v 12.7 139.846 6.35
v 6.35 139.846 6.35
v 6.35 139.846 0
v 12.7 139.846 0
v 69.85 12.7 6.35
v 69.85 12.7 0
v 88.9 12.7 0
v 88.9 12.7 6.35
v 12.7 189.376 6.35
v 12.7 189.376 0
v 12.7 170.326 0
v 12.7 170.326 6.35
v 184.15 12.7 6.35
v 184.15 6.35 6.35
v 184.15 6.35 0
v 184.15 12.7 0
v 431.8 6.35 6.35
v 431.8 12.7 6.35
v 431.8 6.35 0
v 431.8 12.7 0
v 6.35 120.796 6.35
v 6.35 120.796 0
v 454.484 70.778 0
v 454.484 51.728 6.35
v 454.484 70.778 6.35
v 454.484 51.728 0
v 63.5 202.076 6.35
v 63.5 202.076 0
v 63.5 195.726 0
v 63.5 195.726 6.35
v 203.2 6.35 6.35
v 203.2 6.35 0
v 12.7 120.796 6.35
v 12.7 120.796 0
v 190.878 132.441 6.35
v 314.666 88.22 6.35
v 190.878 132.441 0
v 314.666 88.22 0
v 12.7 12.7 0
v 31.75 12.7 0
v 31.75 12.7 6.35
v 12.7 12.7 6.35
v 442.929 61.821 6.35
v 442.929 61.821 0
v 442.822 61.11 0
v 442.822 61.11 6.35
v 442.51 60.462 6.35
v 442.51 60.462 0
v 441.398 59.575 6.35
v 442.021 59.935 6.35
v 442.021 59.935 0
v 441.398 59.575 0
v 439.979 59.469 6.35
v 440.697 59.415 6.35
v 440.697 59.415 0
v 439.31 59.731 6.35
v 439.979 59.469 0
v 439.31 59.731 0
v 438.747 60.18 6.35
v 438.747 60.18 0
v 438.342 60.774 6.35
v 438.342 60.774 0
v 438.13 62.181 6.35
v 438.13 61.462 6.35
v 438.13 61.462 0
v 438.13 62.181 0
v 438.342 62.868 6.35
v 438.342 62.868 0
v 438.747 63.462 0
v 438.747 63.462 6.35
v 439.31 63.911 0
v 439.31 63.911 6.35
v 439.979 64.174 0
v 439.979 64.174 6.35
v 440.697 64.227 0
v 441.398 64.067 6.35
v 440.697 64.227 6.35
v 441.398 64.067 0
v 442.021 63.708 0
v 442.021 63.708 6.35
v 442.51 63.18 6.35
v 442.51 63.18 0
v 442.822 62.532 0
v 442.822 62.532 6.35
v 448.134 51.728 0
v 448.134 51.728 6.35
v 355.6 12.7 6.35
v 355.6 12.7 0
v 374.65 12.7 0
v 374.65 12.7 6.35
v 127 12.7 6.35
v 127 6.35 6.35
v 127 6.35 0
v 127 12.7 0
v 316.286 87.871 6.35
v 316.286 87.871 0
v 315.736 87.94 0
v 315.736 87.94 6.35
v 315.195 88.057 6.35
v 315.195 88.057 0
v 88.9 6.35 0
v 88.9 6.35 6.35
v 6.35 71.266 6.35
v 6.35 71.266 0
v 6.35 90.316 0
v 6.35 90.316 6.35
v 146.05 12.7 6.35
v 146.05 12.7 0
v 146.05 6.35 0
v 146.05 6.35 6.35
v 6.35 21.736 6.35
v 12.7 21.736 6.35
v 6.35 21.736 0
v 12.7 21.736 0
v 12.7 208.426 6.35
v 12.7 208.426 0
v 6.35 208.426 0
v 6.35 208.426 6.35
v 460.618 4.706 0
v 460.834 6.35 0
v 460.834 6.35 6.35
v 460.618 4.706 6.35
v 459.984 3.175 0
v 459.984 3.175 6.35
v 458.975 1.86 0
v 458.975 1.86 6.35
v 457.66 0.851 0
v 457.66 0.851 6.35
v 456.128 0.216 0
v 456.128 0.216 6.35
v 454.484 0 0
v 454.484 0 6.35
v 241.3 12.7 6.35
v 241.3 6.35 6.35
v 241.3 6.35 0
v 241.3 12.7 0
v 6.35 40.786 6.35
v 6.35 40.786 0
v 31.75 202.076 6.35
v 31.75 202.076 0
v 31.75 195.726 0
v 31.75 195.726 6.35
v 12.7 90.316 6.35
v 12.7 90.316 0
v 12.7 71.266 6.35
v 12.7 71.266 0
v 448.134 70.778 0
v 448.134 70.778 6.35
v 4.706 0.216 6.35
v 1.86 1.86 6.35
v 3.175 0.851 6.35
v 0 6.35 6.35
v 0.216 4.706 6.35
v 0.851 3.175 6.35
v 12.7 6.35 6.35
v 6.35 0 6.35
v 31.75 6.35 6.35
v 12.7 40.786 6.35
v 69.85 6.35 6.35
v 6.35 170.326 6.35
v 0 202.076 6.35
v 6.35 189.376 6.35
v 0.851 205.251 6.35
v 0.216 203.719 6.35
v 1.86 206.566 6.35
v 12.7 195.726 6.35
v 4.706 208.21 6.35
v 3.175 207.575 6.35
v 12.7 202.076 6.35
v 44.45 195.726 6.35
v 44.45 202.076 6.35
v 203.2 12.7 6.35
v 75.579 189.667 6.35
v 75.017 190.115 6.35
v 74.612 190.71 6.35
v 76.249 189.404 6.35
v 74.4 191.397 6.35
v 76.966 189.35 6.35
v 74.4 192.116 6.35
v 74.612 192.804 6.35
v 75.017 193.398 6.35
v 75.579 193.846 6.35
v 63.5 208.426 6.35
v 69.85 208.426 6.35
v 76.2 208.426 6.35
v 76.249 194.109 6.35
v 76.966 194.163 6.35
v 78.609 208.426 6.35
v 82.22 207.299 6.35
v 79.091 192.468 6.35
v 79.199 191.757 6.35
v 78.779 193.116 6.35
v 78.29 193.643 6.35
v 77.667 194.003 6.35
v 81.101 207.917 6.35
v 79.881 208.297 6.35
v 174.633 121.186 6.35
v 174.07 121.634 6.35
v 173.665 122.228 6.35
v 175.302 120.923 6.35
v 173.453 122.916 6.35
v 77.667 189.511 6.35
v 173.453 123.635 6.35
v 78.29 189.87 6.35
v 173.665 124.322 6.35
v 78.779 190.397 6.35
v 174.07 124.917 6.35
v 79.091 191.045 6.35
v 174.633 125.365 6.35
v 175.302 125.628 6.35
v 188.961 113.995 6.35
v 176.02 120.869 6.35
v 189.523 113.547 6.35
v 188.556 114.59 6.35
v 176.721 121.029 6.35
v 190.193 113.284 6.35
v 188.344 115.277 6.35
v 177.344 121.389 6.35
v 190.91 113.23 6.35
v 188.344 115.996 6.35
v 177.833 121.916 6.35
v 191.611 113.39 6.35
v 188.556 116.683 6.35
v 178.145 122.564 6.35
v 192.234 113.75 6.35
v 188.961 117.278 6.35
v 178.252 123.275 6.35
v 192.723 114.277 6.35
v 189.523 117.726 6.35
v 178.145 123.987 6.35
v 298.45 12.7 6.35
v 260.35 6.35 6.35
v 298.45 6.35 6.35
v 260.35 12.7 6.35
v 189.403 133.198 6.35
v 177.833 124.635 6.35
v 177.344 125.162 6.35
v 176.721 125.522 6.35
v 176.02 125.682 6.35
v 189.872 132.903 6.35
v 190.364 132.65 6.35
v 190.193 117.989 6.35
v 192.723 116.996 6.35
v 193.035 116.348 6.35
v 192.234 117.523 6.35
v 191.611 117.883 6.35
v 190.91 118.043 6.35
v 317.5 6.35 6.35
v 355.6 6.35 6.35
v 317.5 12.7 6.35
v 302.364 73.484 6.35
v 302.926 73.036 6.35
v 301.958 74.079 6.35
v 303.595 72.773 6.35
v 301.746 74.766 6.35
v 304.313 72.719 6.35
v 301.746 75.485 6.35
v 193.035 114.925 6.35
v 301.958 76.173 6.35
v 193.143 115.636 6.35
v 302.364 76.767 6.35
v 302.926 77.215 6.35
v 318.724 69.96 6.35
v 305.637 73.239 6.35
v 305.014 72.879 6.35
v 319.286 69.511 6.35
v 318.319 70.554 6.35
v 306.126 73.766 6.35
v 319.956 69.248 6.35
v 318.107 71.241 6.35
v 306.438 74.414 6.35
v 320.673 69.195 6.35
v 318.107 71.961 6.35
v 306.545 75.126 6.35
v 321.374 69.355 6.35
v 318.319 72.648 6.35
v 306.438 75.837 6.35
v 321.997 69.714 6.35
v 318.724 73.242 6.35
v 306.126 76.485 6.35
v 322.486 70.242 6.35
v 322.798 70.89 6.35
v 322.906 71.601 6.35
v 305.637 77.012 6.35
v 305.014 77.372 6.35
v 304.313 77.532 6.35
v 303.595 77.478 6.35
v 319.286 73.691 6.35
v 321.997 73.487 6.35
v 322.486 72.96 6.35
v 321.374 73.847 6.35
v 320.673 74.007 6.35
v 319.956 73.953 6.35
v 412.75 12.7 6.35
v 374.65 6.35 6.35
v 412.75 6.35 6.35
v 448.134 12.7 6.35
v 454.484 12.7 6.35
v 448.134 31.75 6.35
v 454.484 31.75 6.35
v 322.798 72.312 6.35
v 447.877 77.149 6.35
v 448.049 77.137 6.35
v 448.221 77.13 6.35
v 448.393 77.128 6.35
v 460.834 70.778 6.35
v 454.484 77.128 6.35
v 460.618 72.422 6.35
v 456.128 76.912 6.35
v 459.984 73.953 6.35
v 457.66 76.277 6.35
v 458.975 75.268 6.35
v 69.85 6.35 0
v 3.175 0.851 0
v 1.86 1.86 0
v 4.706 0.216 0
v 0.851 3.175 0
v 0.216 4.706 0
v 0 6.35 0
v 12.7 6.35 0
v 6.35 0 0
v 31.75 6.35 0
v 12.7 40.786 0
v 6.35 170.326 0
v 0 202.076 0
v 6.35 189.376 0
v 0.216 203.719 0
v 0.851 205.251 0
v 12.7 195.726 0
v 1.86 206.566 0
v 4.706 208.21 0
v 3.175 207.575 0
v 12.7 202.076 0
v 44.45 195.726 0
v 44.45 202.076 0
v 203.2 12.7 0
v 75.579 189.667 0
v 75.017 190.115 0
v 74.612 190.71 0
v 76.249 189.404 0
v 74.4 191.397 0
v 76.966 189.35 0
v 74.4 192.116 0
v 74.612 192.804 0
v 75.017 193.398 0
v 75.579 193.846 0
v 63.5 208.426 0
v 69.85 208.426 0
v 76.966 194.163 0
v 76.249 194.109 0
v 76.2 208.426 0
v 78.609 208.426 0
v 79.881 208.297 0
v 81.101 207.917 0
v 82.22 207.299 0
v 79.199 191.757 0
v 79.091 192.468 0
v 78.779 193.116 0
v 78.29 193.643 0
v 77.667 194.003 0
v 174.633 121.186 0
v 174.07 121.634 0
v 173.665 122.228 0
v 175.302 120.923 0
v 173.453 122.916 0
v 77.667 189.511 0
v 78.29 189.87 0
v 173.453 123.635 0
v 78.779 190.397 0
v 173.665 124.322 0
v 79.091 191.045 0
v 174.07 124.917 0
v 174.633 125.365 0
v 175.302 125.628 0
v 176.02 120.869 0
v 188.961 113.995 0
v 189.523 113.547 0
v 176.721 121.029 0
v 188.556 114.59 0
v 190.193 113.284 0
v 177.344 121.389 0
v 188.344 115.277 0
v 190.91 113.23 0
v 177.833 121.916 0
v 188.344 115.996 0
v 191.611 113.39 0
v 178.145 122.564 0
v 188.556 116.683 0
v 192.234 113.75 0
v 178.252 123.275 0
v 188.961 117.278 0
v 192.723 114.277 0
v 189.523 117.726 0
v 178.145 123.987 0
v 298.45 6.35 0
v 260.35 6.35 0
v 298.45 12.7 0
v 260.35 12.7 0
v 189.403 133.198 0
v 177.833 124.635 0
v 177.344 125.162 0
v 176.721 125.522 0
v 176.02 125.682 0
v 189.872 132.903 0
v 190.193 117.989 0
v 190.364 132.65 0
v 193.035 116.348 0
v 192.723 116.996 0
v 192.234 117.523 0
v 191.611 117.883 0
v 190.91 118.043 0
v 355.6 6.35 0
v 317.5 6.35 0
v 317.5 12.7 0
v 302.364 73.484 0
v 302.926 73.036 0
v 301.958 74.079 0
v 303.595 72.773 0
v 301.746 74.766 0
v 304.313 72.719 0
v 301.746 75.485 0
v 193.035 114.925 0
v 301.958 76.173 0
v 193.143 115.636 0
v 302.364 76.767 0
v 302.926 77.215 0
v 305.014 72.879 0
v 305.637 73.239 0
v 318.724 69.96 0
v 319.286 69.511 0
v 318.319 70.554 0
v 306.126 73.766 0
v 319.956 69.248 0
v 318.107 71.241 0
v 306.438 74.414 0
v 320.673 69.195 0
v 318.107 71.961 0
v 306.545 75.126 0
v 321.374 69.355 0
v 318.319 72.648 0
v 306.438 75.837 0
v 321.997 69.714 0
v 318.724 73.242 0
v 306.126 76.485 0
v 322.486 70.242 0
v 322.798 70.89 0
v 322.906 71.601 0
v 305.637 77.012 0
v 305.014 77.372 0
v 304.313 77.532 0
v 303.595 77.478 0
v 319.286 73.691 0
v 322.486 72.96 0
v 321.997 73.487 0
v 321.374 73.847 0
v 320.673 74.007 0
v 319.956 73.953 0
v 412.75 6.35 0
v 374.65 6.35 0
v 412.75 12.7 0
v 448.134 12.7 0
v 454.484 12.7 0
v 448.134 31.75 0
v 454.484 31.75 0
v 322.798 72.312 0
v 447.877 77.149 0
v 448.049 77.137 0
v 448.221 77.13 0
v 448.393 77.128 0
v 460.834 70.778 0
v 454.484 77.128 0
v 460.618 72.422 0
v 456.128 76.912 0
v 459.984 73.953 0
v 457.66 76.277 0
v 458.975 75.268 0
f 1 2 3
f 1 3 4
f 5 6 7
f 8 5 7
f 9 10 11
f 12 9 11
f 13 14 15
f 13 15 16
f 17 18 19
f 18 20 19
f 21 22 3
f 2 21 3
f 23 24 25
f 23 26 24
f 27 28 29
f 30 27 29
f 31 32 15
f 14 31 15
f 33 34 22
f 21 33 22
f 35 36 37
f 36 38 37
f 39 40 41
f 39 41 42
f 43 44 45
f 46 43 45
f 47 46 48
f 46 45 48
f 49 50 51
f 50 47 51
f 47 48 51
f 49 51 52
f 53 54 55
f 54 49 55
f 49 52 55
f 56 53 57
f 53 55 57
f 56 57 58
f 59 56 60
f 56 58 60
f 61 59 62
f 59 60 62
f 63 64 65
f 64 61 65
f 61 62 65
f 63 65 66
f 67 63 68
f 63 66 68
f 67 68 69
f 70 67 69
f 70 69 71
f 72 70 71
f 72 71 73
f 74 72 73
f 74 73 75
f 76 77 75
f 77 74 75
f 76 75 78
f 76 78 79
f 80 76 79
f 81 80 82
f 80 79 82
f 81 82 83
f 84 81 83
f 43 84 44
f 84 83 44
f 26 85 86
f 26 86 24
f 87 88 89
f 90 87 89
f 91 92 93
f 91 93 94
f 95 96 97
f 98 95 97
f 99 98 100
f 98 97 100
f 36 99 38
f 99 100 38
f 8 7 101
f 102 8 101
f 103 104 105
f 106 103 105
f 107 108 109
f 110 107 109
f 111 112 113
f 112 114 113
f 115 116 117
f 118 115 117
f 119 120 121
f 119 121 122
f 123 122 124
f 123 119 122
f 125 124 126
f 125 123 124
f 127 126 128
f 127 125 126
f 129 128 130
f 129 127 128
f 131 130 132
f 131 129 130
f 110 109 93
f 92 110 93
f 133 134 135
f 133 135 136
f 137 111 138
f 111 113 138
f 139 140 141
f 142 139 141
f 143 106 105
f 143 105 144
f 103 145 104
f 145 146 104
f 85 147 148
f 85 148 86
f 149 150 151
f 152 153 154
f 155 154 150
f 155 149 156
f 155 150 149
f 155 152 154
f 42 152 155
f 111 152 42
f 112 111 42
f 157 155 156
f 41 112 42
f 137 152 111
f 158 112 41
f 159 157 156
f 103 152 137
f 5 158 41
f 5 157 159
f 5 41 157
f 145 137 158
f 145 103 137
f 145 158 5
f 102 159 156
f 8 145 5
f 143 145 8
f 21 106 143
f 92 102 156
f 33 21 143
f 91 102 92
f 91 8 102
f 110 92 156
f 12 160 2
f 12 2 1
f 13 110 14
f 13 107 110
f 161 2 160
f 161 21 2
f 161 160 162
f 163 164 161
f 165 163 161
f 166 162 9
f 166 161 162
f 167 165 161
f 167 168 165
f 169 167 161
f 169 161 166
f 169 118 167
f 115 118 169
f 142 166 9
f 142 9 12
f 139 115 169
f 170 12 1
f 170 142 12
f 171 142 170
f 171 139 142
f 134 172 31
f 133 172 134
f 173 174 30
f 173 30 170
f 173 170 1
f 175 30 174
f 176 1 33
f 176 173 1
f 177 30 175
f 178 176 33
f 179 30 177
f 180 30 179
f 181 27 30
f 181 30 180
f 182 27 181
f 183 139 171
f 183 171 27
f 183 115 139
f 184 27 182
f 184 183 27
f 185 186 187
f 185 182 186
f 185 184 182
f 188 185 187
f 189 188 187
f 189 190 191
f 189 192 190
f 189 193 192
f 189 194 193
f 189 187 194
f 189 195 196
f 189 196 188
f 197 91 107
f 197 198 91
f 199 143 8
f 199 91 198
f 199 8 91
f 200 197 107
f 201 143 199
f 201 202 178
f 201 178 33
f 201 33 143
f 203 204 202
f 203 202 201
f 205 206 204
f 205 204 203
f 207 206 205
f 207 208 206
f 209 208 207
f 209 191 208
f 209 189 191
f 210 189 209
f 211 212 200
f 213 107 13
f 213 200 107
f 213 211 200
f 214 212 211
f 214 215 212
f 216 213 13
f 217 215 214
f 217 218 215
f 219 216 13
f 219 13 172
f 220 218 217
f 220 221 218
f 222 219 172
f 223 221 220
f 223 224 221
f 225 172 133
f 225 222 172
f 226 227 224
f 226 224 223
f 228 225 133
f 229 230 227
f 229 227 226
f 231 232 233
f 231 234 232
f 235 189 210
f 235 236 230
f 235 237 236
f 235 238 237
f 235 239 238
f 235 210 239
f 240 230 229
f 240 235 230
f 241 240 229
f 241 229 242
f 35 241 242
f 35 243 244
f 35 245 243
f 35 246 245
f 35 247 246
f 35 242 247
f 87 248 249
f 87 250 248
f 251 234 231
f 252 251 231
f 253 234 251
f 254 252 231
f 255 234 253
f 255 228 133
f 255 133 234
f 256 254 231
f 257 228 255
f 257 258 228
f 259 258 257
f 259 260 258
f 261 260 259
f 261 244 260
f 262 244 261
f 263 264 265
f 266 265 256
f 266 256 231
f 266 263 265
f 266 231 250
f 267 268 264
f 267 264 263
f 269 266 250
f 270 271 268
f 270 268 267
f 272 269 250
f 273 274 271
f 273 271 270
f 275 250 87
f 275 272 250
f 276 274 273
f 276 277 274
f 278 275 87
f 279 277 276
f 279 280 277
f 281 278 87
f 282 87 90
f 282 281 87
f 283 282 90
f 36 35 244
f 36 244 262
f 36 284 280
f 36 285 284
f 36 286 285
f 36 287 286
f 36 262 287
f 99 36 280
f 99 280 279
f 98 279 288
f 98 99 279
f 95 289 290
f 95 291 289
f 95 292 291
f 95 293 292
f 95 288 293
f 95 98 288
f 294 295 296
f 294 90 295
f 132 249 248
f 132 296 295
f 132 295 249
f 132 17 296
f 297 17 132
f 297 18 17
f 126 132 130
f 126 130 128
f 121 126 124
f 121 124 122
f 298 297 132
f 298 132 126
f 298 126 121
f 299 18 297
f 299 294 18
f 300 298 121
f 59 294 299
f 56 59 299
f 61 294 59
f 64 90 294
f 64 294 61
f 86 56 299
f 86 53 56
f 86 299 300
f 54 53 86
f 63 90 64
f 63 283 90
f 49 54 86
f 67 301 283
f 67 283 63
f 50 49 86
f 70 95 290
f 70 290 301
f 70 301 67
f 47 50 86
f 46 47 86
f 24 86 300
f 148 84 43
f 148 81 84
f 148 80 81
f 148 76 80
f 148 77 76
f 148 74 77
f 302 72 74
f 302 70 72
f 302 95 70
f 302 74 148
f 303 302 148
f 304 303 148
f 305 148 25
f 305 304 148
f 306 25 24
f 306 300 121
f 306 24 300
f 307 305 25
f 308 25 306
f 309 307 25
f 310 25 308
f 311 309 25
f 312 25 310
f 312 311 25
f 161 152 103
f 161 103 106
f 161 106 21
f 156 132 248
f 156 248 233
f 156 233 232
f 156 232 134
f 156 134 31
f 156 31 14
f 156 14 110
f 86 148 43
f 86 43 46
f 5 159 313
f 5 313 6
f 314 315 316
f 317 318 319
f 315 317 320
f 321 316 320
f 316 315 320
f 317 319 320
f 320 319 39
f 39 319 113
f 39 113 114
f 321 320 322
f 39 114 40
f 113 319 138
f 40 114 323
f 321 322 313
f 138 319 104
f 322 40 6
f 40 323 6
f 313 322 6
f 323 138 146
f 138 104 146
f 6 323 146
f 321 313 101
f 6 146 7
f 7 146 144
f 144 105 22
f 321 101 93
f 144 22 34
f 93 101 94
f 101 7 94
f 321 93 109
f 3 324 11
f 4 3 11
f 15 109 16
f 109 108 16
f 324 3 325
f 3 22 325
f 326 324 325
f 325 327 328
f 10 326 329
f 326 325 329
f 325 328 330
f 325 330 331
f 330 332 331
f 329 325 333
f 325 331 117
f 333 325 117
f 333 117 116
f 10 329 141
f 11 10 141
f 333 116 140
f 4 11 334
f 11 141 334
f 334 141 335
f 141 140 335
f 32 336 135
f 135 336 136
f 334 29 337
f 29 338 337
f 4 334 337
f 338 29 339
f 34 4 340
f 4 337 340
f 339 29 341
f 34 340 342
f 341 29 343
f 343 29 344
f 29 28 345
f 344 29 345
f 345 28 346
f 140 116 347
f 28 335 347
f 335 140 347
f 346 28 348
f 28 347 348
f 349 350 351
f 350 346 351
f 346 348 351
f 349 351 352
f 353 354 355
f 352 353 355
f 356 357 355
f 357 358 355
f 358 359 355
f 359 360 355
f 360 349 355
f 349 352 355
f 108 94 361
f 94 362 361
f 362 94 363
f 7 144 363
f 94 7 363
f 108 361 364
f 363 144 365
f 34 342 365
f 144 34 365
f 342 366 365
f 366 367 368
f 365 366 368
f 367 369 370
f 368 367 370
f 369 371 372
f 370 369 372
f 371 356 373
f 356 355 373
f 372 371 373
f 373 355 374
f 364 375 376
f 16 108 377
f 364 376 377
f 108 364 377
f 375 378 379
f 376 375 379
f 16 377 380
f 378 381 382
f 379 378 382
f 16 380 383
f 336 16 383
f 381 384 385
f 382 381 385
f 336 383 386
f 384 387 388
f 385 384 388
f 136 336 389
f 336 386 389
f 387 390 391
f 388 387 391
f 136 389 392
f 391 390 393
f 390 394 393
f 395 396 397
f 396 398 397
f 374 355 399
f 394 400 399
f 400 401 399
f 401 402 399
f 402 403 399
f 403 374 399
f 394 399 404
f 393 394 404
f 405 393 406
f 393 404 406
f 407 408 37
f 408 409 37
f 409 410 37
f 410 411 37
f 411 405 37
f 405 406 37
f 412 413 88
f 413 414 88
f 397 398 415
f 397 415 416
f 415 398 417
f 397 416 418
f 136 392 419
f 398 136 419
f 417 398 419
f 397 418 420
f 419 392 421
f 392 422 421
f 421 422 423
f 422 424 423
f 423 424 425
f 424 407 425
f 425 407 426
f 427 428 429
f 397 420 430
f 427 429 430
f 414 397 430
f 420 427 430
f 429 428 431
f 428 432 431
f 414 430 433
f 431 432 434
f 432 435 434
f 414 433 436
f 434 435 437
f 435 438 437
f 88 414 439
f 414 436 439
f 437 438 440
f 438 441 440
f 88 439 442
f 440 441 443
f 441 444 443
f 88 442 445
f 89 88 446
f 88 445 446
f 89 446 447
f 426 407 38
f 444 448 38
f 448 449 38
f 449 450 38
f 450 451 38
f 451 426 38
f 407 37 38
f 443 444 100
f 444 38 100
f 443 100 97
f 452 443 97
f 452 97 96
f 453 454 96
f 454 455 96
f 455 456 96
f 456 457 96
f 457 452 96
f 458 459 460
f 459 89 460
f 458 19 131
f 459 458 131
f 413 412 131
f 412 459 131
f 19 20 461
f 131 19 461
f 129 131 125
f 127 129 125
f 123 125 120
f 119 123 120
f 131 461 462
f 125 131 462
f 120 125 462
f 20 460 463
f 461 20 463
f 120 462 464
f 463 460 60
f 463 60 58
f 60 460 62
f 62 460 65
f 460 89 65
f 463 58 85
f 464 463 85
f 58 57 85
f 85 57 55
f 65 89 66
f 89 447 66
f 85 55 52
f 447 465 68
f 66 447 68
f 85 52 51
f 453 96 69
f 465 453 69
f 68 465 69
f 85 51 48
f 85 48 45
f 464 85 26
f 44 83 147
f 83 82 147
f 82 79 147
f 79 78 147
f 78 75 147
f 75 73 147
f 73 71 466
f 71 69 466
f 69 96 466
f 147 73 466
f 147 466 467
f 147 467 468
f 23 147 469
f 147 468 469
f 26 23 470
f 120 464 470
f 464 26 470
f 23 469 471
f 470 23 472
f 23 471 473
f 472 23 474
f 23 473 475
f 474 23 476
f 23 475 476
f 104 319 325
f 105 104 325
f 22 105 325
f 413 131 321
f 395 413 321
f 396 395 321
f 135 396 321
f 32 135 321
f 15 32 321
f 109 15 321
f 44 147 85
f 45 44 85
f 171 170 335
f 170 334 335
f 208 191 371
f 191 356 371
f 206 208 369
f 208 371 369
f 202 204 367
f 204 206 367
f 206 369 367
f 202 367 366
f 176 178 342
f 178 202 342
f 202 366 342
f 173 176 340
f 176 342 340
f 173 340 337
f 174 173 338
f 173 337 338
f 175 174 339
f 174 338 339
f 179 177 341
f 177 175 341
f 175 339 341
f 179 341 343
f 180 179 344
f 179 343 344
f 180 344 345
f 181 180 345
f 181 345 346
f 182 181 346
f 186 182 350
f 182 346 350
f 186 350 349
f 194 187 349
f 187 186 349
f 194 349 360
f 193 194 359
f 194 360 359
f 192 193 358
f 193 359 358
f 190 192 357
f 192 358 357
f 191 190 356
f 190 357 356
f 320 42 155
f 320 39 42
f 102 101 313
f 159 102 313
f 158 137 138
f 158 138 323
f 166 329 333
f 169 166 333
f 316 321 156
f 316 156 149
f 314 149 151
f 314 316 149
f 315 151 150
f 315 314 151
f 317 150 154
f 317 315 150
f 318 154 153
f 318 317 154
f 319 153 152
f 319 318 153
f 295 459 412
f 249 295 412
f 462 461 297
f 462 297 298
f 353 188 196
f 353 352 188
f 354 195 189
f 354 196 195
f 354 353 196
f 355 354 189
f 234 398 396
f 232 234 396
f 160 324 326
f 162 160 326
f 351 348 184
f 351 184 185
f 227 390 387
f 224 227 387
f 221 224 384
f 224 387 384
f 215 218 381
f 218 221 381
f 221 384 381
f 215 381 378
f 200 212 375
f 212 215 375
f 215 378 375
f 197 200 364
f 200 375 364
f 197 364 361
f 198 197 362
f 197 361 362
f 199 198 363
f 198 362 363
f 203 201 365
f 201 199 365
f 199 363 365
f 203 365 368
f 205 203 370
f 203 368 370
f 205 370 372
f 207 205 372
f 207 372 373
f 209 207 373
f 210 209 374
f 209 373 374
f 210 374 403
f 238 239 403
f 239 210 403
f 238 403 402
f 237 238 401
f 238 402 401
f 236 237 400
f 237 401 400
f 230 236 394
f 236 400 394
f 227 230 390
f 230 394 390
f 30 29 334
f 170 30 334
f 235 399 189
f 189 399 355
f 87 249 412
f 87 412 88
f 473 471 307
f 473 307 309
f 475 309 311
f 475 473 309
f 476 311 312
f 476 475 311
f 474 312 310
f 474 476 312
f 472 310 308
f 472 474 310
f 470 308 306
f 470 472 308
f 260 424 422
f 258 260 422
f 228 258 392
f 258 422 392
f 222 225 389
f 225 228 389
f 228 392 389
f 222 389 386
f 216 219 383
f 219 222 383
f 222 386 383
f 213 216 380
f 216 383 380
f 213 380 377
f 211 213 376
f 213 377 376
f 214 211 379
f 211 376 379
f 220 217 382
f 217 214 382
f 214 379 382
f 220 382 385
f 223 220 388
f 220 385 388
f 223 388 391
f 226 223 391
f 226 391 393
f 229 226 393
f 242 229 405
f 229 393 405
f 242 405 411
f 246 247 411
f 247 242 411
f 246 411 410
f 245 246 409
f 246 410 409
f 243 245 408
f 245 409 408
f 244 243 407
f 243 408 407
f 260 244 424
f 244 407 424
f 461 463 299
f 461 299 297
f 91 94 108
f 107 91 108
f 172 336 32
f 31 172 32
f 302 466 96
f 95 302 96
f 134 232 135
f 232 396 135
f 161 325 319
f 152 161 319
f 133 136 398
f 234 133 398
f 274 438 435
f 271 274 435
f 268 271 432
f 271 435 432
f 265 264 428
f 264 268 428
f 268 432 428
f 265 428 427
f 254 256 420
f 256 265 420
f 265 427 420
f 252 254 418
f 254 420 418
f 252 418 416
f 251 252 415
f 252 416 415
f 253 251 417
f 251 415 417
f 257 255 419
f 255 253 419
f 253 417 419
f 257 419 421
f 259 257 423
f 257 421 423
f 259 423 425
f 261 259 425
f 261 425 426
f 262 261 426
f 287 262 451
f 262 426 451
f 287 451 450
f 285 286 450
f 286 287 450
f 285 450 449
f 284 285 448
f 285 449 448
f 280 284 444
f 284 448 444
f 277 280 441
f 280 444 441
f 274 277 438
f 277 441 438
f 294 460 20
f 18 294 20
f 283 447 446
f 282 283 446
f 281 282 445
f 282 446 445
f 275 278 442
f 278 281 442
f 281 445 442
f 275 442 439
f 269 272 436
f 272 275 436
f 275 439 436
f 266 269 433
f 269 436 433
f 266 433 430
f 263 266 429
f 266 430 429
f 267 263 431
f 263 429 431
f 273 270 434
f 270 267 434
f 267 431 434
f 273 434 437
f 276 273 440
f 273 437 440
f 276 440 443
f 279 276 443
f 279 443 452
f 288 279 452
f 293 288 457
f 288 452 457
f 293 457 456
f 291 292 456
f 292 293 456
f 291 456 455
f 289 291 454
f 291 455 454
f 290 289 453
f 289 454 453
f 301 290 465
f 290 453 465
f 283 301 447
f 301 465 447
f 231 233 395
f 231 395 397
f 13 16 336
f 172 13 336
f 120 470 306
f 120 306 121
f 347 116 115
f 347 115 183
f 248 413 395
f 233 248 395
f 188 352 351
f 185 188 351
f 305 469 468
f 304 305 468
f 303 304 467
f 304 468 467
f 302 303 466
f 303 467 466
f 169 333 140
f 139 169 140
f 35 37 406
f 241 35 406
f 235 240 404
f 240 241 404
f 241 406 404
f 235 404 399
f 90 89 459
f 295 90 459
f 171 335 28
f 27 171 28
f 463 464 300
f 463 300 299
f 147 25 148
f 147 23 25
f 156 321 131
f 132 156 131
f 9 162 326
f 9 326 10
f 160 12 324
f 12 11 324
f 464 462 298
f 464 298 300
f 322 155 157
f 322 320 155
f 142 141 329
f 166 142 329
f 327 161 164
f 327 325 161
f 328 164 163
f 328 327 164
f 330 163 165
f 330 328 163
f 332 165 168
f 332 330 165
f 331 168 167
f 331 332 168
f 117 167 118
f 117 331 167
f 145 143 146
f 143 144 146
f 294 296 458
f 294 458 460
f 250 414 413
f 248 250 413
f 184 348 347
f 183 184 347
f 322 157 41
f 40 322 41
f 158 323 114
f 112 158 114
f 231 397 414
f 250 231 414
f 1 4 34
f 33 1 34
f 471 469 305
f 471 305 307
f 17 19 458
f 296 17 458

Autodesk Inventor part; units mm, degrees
ref_plane "YZ Plane" through (0, 0, 0) normal (1, 0, 0) x (0, 1, 0)
ref_plane "XZ Plane" through (0, 0, 0) normal (0, 1, 0) x (-1, 0, 0)
ref_plane "XY Plane" through (0, 0, 0) normal (0, 0, 1) x (1, 0, 0)
sketch "Sketch1" plane through (0, 0, 0) normal (0, 0, 1) x (1, 0, 0)
  line L0 (447.8771, 77.149) -> (316.286, 87.8713)
  line L1 (314.6655, 88.2204) -> (190.8775, 132.4412)
  line L2 (189.4026, 133.1978) -> (82.2199, 207.2992)
  line L3 (0, 202.0759) -> (0, 6.35)
  circle A0 centre (440.5162, 61.8212) radius 2.413
  circle A1 centre (320.4926, 71.6009) radius 2.413
  line L4 (448.1345, 77.128) -> (443.7313, 23.0895) construction
  line L5 (315.4528, 87.9391) -> (312.3268, 49.5751) construction
  line L6 (315.4528, 87.9391) -> (300.5748, 46.291) construction
  circle A2 centre (190.7297, 115.6365) radius 2.413
  circle A3 centre (304.1324, 75.1256) radius 2.413
  line L7 (190.0903, 132.7224) -> (175.3821, 91.5497) construction
  line L8 (190.0903, 132.7224) -> (160.9674, 90.5981) construction
  circle A4 centre (175.8392, 123.2754) radius 2.413
  circle A5 centre (76.7856, 191.7567) radius 2.413
  line L9 (80.5901, 208.4259) -> (54.0448, 170.0299) construction
  line L10 (69.85, 208.4259) -> (76.2, 208.4259)
  line L11 (76.2, 202.0759) -> (76.2, 208.4259) construction
  line L12 (448.3928, 77.128) -> (454.4845, 77.128)
  line L13 (12.7, 208.4259) -> (6.35, 208.4259)
  line L14 (78.6088, 208.4259) -> (63.5, 208.4259)
  line L15 (12.7, 208.4259) -> (63.5, 208.4259)
  line L16 (12.7, 202.0759) -> (31.75, 202.0759)
  line L17 (31.75, 202.0759) -> (31.75, 195.7259)
  line L18 (31.75, 195.7259) -> (12.7, 195.7259)
  line L19 (12.7, 195.7259) -> (12.7, 202.0759)
  line L20 (44.45, 202.0759) -> (63.5, 202.0759)
  line L21 (63.5, 202.0759) -> (63.5, 195.7259)
  line L22 (63.5, 195.7259) -> (44.45, 195.7259)
  line L23 (44.45, 195.7259) -> (44.45, 202.0759)
  line L24 (63.5, 195.7259) -> (71.8099, 195.7259) construction
  line L25 (71.8099, 195.7259) -> (71.8099, 208.4259) construction
  line L26 (12.7, 6.35) -> (31.75, 6.35)
  line L27 (31.75, 6.35) -> (31.75, 12.7)
  line L28 (31.75, 12.7) -> (12.7, 12.7)
  line L29 (12.7, 12.7) -> (12.7, 6.35)
  line L30 (69.85, 12.7) -> (88.9, 12.7)
  line L31 (88.9, 12.7) -> (88.9, 6.35)
  line L32 (88.9, 6.35) -> (69.85, 6.35)
  line L33 (69.85, 6.35) -> (69.85, 12.7)
  line L34 (127, 12.7) -> (146.05, 12.7)
  line L35 (146.05, 12.7) -> (146.05, 6.35)
  line L36 (146.05, 6.35) -> (127, 6.35)
  line L37 (127, 6.35) -> (127, 12.7)
  line L38 (184.15, 12.7) -> (203.2, 12.7)
  line L39 (203.2, 12.7) -> (203.2, 6.35)
  line L40 (203.2, 6.35) -> (184.15, 6.35)
  line L41 (184.15, 6.35) -> (184.15, 12.7)
  line L42 (241.3, 12.7) -> (260.35, 12.7)
  line L43 (260.35, 12.7) -> (260.35, 6.35)
  line L44 (260.35, 6.35) -> (241.3, 6.35)
  line L45 (241.3, 6.35) -> (241.3, 12.7)
  line L46 (298.45, 12.7) -> (317.5, 12.7)
  line L47 (317.5, 12.7) -> (317.5, 6.35)
  line L48 (317.5, 6.35) -> (298.45, 6.35)
  line L49 (298.45, 6.35) -> (298.45, 12.7)
  line L50 (355.6, 12.7) -> (374.65, 12.7)
  line L51 (374.65, 12.7) -> (374.65, 6.35)
  line L52 (374.65, 6.35) -> (355.6, 6.35)
  line L53 (355.6, 6.35) -> (355.6, 12.7)
  line L54 (412.75, 12.7) -> (431.8, 12.7)
  line L55 (431.8, 12.7) -> (431.8, 6.35)
  line L56 (431.8, 6.35) -> (412.75, 6.35)
  line L57 (412.75, 6.35) -> (412.75, 12.7)
  line L58 (460.8345, 70.778) -> (460.8345, 6.35)
  line L59 (454.4845, 0) -> (454.4845, 0)
  line L60 (448.1345, 12.7) -> (454.4845, 12.7)
  line L61 (454.4845, 12.7) -> (454.4845, 31.75)
  line L62 (454.4845, 31.75) -> (448.1345, 31.75)
  line L63 (448.1345, 31.75) -> (448.1345, 12.7)
  line L64 (448.1345, 51.728) -> (454.4845, 51.728)
  line L65 (454.4845, 51.728) -> (454.4845, 70.778)
  line L66 (454.4845, 70.778) -> (448.1345, 70.778)
  line L67 (448.1345, 70.778) -> (448.1345, 51.728)
  line L68 (6.35, 189.3759) -> (12.7, 189.3759)
  line L69 (12.7, 189.3759) -> (12.7, 170.3259)
  line L70 (12.7, 170.3259) -> (6.35, 170.3259)
  line L71 (6.35, 170.3259) -> (6.35, 189.3759)
  line L72 (6.35, 139.8459) -> (12.7, 139.8459)
  line L73 (12.7, 139.8459) -> (12.7, 120.7959)
  line L74 (12.7, 120.7959) -> (6.35, 120.7959)
  line L75 (6.35, 120.7959) -> (6.35, 139.8459)
  line L76 (6.35, 90.3159) -> (12.7, 90.3159)
  line L77 (12.7, 90.3159) -> (12.7, 71.2659)
  line L78 (12.7, 71.2659) -> (6.35, 71.2659)
  line L79 (6.35, 71.2659) -> (6.35, 90.3159)
  line L80 (6.35, 40.7859) -> (12.7, 40.7859)
  line L81 (12.7, 40.7859) -> (12.7, 21.7359)
  line L82 (12.7, 21.7359) -> (6.35, 21.7359)
  line L83 (6.35, 21.7359) -> (6.35, 40.7859)
  arc A6 (6.35, 208.4259) -> (0, 202.0759) centre (6.35, 202.0759) ccw
  arc A7 (82.2199, 207.2992) -> (78.6088, 208.4259) centre (78.6088, 202.0759) ccw
  arc A8 (189.4026, 133.1978) -> (190.8775, 132.4412) centre (193.0137, 138.4211) ccw
  arc A9 (314.6655, 88.2204) -> (316.286, 87.8713) centre (316.8017, 94.2003) ccw
  arc A10 (447.8771, 77.149) -> (448.3928, 77.128) centre (448.3928, 83.478) ccw
  arc A11 (460.8345, 70.778) -> (454.4845, 77.128) centre (454.4845, 70.778) ccw
  arc A12 (454.4845, 0) -> (460.8345, 6.35) centre (454.4845, 6.35) ccw
  arc A13 (0, 6.35) -> (6.35, 0) centre (6.35, 6.35) ccw
  line L84 (6.35, 0) -> (454.4845, 0)
  point P0 (0, 0)
  point P1 (0, 0)
  point P2 (460.8345, 77.128)
  dimension "d3" = 4.826
  dimension "d4" = 4.826
  dimension "d5" = 15.875
  dimension "d6" = 15.875
  dimension "d7" = 120.4214
  dimension "d8" = 90
  dimension "d9" = 6.35
  dimension "d11" = 90
  dimension "d12" = 90
  dimension "d13" = 165
  dimension "d14" = 6.35
  dimension "d16" = 4.826
  dimension "d17" = 4.826
  dimension "d18" = 6.35
  dimension "d19" = 15.875
  dimension "d20" = 15.875
  dimension "d21" = 120.4214
  dimension "d22" = 165
  dimension "d23" = 90
  dimension "d24" = 90
  dimension "d25" = 6.35
  dimension "d26" = 4.826
  dimension "d27" = 4.826
  dimension "d28" = 6.35
  dimension "d29" = 15.875
  dimension "d30" = 15.875
  dimension "d31" = 120.4214
  dimension "d32" = 90
  dimension "d33" = 6.35
  dimension "d38" = 6.35
  dimension "d39" = 12.7
  dimension "d41" = 76.2
  dimension "d76" = 19.05
  dimension "d77" = 6.35
  dimension "d78" = 19.05
  dimension "d79" = 6.35
  dimension "d80" = 12.7
  dimension "d81" = 12.7
  dimension "d82" = 6.35
  dimension "d83" = 6.35
  dimension "d84" = 71.8099
  dimension "d86" = 6.35
  dimension "d87" = 19.05
  dimension "d88" = 6.35
  dimension "d89" = 19.05
  dimension "d91" = 6.35
  dimension "d92" = 6.35
  dimension "d93" = 6.35
  dimension "d94" = 6.35
  dimension "d97" = 19.05
  dimension "d98" = 19.05
  dimension "d99" = 19.05
  dimension "d100" = 19.05
  dimension "d102" = 12.7
  dimension "d106" = 38.1
  dimension "d107" = 38.1
  dimension "d109" = 38.1
  dimension "d112" = 38.1
  dimension "d113" = 38.1
  dimension "d115" = 19.05
  dimension "d116" = 6.35
  dimension "d117" = 38.1
  dimension "d119" = 38.1
  dimension "d120" = 6.35
extrude "Extrusion2" add sketch "Sketch1" along normal blind 6.35
equation "\"d4\" = d3"
equation "\"d5\" = d6"
equation "\"d14\" = d9"
equation "\"d16\" = d3"
equation "\"d17\" = d3"
equation "\"d18\" = d9"
equation "\"d19\" = d6"
equation "\"d20\" = d6"
equation "\"d21\" = d7"
equation "\"d22\" = d13"
equation "\"d25\" = d9"
equation "\"d26\" = d3"
equation "\"d27\" = d3"
equation "\"d28\" = d9"
equation "\"d29\" = d6"
equation "\"d30\" = d6"
equation "\"d31\" = d7"
equation "\"d33\" = d9"
equation "\"d78\" = d76"
equation "\"d81\" = d80"
equation "\"d83\" = d82"
equation "\"d86\" = d77"
equation "\"d87\" = d76"
equation "\"d88\" = d86"
equation "\"d89\" = d87"
equation "\"d91\" = d86"
equation "\"d92\" = d86"
equation "\"d93\" = d86"
equation "\"d94\" = d93"
properties part number "9U Cheek V3"
